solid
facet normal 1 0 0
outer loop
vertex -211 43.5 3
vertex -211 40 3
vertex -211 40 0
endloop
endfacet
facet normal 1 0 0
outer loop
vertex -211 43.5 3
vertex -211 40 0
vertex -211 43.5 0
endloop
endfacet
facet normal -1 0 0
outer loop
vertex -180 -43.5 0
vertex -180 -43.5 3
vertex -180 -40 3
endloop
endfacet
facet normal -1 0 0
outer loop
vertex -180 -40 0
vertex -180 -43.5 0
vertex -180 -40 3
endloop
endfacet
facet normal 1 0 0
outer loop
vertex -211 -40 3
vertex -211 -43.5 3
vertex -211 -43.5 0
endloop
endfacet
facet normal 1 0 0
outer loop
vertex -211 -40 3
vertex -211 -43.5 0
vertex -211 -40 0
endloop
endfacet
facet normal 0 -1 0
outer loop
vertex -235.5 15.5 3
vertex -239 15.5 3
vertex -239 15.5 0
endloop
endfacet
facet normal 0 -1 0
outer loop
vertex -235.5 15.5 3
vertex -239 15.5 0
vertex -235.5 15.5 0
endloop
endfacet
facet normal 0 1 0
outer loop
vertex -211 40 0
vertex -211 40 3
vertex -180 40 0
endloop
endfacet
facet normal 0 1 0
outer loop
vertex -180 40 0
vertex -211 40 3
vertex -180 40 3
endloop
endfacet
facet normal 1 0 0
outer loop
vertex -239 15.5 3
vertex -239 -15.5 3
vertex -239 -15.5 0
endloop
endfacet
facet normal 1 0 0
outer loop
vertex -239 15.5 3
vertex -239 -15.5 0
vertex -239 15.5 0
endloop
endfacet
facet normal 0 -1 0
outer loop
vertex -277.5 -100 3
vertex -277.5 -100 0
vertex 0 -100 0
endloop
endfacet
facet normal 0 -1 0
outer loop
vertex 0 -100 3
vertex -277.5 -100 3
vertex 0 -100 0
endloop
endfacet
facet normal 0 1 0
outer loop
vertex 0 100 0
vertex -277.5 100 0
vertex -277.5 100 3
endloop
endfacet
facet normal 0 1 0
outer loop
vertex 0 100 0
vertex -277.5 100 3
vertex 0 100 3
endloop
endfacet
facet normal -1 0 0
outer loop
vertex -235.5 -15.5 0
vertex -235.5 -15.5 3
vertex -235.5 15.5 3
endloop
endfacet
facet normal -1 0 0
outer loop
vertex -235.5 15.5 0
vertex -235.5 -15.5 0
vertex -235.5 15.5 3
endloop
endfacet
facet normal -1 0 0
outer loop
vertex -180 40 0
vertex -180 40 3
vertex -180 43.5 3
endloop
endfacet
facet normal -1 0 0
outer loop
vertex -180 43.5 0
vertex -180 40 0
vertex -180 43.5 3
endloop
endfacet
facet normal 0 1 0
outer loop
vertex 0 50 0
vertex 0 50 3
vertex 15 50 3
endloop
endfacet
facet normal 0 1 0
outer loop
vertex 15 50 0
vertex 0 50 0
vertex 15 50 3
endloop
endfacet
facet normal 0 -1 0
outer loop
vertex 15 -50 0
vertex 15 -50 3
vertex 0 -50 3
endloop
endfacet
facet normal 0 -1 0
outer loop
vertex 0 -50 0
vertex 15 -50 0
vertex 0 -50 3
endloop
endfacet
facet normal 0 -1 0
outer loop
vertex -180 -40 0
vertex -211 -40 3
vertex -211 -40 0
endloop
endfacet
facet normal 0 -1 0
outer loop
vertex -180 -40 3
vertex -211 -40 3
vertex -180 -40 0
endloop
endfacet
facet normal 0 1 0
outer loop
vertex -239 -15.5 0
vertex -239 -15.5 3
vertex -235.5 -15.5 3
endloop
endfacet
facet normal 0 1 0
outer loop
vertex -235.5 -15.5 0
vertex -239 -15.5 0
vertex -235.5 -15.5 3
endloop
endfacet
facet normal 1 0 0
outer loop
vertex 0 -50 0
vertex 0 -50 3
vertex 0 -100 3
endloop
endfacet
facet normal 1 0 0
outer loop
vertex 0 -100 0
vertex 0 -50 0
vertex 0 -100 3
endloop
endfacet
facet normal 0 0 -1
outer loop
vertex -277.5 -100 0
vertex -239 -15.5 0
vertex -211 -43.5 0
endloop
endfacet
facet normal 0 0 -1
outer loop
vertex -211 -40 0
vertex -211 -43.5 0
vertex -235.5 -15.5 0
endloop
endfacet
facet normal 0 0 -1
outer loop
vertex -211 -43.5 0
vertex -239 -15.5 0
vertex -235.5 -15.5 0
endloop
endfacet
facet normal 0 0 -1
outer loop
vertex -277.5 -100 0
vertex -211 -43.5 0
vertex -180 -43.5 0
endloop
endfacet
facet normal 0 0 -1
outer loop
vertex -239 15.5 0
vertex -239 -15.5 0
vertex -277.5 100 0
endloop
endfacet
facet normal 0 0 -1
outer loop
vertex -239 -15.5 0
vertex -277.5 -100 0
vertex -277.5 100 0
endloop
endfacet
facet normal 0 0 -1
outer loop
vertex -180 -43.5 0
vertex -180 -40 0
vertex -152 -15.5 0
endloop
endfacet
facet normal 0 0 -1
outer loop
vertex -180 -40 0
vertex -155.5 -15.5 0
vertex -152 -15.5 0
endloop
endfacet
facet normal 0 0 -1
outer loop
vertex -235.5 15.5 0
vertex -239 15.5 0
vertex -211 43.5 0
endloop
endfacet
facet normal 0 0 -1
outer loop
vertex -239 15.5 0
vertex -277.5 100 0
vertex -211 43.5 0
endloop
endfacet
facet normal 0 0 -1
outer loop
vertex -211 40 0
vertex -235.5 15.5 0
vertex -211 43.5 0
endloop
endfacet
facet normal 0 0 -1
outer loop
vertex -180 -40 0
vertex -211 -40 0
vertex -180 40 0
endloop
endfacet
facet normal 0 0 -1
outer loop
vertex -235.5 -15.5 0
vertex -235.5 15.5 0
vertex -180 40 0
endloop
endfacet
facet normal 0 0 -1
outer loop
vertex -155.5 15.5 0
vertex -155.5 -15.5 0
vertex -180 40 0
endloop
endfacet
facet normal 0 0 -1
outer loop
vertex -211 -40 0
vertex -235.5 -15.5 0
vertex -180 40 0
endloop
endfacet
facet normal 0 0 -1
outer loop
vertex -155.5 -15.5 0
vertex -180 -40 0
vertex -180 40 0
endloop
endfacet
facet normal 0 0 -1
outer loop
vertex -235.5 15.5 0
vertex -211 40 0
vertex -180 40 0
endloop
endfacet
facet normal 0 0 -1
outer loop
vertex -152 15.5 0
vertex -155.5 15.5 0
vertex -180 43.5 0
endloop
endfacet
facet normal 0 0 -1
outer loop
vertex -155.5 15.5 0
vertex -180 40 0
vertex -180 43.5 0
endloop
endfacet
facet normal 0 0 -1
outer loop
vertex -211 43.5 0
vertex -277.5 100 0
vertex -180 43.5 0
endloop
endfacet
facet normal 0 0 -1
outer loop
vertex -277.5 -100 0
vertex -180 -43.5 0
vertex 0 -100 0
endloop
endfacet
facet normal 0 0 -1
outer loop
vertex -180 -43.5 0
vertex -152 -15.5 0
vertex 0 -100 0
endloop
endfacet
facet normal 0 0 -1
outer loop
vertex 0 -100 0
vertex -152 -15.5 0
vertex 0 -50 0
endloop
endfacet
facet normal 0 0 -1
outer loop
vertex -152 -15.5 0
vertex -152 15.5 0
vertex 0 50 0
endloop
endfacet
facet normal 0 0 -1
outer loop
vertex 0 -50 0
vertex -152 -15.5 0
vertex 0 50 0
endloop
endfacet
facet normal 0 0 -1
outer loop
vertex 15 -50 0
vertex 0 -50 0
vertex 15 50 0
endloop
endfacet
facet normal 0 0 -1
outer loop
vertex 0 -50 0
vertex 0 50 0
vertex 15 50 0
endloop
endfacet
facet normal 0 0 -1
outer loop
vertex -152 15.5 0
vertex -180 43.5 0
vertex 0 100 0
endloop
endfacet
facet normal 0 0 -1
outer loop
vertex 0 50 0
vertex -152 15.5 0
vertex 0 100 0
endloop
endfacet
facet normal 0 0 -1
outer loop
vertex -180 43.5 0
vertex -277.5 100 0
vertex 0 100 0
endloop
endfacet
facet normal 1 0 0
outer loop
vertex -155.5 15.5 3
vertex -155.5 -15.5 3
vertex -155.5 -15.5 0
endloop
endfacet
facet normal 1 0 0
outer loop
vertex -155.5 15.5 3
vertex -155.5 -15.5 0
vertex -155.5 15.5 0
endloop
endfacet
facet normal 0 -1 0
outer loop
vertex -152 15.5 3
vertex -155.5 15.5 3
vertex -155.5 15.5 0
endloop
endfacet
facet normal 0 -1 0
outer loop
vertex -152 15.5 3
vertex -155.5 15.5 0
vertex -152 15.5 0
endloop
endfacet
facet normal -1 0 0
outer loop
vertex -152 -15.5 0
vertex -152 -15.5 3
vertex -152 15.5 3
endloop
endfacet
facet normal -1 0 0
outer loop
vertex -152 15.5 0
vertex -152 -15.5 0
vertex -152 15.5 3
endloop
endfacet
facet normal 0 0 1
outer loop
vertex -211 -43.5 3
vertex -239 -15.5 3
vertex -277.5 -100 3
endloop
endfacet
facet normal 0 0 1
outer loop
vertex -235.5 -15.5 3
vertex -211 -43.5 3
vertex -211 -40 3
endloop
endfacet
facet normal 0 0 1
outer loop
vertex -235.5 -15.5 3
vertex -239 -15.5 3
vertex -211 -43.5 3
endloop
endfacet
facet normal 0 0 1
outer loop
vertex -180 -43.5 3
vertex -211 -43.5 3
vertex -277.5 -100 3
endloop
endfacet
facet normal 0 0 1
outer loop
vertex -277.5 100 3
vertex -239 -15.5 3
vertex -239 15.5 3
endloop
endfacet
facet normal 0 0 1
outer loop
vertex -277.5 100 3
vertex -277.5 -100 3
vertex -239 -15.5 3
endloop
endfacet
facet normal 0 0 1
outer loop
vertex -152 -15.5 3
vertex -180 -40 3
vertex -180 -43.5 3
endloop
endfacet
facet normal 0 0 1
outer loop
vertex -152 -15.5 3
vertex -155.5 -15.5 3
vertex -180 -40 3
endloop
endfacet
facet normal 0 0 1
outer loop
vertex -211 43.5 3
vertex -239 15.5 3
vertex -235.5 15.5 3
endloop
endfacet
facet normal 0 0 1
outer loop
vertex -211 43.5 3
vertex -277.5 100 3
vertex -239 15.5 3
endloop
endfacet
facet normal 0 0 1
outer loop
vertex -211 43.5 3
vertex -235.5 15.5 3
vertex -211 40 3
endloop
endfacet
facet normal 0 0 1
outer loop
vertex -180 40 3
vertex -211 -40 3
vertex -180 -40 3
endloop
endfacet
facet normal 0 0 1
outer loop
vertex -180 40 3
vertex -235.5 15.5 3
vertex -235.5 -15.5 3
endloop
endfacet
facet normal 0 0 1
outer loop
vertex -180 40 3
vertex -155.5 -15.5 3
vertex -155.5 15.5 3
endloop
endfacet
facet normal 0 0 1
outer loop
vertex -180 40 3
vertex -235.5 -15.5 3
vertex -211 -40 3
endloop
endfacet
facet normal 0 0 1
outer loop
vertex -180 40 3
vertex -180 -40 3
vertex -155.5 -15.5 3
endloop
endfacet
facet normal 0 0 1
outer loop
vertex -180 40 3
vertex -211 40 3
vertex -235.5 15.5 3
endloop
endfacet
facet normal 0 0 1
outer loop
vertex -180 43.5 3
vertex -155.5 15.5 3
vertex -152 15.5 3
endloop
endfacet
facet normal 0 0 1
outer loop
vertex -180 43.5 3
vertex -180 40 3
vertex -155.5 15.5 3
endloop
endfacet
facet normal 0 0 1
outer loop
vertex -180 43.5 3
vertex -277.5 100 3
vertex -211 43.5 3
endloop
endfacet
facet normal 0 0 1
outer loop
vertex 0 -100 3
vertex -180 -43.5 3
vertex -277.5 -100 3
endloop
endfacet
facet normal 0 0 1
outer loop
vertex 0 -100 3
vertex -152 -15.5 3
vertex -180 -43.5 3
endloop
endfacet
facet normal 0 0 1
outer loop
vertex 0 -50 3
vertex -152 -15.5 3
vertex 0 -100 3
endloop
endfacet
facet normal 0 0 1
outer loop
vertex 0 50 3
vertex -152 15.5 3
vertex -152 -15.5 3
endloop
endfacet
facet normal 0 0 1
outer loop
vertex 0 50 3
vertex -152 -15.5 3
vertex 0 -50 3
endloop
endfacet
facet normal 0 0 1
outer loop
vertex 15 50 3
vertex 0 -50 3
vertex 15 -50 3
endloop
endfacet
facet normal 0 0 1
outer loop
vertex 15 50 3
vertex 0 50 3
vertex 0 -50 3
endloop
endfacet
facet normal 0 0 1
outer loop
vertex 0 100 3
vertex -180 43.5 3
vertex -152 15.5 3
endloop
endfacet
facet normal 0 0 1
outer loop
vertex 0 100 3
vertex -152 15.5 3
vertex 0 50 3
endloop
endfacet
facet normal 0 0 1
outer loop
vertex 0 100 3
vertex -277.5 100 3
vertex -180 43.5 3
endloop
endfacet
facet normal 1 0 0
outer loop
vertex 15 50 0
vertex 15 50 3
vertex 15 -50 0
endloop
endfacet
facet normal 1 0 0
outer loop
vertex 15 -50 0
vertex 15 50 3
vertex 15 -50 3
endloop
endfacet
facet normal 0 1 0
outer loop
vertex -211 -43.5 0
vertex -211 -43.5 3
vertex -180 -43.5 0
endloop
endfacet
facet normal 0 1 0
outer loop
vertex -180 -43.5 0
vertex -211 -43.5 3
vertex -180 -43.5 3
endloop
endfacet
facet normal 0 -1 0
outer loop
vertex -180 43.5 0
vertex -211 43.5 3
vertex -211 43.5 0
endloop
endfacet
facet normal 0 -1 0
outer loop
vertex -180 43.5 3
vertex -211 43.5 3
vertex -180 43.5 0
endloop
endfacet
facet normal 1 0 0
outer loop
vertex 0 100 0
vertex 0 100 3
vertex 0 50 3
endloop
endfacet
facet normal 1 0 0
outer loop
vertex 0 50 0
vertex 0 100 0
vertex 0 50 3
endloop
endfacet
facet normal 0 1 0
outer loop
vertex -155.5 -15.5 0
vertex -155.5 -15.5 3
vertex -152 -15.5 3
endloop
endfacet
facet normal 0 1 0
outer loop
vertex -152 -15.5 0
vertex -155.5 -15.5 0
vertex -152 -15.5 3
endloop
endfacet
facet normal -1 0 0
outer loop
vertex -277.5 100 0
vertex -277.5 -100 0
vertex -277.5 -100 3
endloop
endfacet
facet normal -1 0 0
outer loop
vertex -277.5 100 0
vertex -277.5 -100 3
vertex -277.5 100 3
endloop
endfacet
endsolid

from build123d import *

# Parameters (mm, degrees)
ESBO_O1_W                = 555
ESBO_O1_H                = 200
RESSALTO_EXTRUS_O1_DEPTH = 3
ESBO_O2_W                = 3.5
ESBO_O2_H                = 31
ESBO_O2_W_2              = 31
ESBO_O2_H_2              = 3.5
CORTE_EXTRUS_O1_DEPTH    = 295.983474113
CORTE_EXTRUS_O2_DEPTH    = 295.983474113


with BuildPart() as part:
    # Esboço1 → Ressalto-extrusão1 (new body)
    with BuildSketch(Plane.XY):
        Rectangle(ESBO_O1_W, ESBO_O1_H)
    extrude(amount=RESSALTO_EXTRUS_O1_DEPTH)

    # Esboço2 → Corte-extrusão1 (cut, through all)
    with BuildSketch(Plane.XY.offset(3)):
        with Locations((237.25, 0)):
            Rectangle(ESBO_O2_W, ESBO_O2_H)
        with Locations((-153.75, 0)):
            Rectangle(ESBO_O2_W, ESBO_O2_H)
        with Locations((-237.25, 0)):
            Rectangle(ESBO_O2_W, ESBO_O2_H)
        with Locations((-195.5, 41.75)):
            Rectangle(ESBO_O2_W_2, ESBO_O2_H_2)
        with Locations((-195.5, -41.75)):
            Rectangle(ESBO_O2_W_2, ESBO_O2_H_2)
        with Locations((153.75, 0)):
            Rectangle(ESBO_O2_W, ESBO_O2_H)
        with Locations((195.5, -41.75)):
            Rectangle(ESBO_O2_W_2, ESBO_O2_H_2)
        with Locations((195.5, 41.75)):
            Rectangle(ESBO_O2_W_2, ESBO_O2_H_2)
    extrude(amount=-CORTE_EXTRUS_O1_DEPTH, mode=Mode.SUBTRACT)

    # Esboço3 → Corte-extrusão2 (cut, through all)
    with BuildSketch(Plane.XY.offset(3)):
        Polygon((0, 100), (0, 50), (15, 50), (15, -50), (0, -50), (0, -100), (277.5, -100), (277.5, 100), align=None)
    extrude(amount=-CORTE_EXTRUS_O2_DEPTH, mode=Mode.SUBTRACT)


solid = part.part
